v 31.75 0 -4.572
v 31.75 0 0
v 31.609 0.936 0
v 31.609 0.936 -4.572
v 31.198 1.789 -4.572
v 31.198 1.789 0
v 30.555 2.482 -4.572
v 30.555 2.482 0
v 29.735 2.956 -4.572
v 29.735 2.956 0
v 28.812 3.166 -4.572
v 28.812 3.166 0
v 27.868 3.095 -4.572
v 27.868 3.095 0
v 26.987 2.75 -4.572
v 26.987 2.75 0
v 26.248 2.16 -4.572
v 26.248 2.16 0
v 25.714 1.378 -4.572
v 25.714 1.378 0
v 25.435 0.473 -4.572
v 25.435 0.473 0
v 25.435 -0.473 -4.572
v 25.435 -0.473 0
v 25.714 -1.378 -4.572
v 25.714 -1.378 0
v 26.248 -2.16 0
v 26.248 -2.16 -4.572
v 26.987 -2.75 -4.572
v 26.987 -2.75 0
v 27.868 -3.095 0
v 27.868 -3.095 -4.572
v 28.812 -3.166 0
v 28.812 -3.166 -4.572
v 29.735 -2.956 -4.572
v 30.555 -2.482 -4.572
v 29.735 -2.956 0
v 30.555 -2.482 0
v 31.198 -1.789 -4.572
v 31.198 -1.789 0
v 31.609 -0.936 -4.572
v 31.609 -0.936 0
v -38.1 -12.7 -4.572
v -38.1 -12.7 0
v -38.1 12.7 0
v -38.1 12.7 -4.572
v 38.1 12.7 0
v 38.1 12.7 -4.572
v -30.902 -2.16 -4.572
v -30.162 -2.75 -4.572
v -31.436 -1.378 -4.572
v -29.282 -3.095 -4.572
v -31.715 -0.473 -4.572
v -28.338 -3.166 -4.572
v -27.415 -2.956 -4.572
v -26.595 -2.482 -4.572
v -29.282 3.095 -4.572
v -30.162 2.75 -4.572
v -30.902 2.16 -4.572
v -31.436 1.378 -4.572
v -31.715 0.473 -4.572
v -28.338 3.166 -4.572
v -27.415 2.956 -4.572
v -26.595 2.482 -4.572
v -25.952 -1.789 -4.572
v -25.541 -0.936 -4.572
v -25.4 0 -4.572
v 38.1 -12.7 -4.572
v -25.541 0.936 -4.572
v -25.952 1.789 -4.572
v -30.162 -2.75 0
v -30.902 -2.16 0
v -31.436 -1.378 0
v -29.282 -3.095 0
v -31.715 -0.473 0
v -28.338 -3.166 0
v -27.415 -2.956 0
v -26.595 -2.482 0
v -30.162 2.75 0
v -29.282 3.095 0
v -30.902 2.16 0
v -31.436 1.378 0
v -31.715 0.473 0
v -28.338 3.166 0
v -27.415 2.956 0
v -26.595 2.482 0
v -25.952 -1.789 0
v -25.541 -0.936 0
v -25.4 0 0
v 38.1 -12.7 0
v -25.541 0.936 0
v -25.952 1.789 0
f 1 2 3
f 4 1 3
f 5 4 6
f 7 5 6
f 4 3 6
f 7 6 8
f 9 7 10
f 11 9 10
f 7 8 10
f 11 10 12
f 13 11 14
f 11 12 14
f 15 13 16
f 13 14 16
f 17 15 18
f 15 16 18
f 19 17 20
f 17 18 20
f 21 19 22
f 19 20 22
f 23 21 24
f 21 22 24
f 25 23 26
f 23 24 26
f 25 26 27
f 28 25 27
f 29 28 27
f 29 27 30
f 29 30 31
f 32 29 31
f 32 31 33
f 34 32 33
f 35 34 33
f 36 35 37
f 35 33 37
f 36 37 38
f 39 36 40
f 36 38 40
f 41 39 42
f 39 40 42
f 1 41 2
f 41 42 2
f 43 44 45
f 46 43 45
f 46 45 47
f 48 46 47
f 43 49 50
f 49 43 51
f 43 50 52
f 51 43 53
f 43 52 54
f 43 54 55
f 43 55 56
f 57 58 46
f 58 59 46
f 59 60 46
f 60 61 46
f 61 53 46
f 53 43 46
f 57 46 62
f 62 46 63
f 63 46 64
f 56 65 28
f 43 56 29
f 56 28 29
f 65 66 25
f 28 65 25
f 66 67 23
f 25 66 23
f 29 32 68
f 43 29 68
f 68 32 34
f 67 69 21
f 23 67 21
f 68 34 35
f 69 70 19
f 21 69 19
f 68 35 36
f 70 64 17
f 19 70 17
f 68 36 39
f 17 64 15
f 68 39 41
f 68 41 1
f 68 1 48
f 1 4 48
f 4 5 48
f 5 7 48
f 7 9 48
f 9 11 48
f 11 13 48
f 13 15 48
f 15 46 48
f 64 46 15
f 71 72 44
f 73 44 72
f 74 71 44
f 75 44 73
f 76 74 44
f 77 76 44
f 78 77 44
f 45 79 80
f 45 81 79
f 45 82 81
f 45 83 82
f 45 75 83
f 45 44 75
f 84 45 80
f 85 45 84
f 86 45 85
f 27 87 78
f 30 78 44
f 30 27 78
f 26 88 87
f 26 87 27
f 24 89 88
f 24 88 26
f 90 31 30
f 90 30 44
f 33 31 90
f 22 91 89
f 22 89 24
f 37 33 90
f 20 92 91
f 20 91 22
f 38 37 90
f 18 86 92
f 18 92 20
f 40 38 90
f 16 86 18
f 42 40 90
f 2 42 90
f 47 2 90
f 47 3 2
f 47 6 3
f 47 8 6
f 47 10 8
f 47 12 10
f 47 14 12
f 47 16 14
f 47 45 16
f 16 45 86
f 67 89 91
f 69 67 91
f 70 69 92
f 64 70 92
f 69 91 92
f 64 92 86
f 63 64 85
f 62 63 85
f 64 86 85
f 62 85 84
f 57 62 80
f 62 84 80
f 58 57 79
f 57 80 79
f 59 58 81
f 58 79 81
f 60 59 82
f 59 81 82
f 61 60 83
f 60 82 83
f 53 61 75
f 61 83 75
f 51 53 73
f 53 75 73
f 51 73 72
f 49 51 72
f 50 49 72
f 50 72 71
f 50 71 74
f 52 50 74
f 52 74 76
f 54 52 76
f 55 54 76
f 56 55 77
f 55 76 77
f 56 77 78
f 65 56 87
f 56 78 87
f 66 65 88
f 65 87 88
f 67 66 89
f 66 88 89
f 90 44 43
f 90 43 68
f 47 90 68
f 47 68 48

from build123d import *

# Parameters (mm, degrees)
SKETCH1_W           = 76.2
SKETCH1_H           = 25.4
SKETCH1_R           = 3.175
BOSS_EXTRUDE1_DEPTH = 4.572


with BuildPart() as part:
    # Sketch1 → Boss-Extrude1 (new body)
    with BuildSketch(Plane.XY):
        Rectangle(SKETCH1_W, SKETCH1_H)
        with Locations((-28.575, 0)):
            Circle(SKETCH1_R, mode=Mode.SUBTRACT)
        with Locations((28.575, 0)):
            Circle(SKETCH1_R, mode=Mode.SUBTRACT)
    extrude(amount=-BOSS_EXTRUDE1_DEPTH)


solid = part.part
